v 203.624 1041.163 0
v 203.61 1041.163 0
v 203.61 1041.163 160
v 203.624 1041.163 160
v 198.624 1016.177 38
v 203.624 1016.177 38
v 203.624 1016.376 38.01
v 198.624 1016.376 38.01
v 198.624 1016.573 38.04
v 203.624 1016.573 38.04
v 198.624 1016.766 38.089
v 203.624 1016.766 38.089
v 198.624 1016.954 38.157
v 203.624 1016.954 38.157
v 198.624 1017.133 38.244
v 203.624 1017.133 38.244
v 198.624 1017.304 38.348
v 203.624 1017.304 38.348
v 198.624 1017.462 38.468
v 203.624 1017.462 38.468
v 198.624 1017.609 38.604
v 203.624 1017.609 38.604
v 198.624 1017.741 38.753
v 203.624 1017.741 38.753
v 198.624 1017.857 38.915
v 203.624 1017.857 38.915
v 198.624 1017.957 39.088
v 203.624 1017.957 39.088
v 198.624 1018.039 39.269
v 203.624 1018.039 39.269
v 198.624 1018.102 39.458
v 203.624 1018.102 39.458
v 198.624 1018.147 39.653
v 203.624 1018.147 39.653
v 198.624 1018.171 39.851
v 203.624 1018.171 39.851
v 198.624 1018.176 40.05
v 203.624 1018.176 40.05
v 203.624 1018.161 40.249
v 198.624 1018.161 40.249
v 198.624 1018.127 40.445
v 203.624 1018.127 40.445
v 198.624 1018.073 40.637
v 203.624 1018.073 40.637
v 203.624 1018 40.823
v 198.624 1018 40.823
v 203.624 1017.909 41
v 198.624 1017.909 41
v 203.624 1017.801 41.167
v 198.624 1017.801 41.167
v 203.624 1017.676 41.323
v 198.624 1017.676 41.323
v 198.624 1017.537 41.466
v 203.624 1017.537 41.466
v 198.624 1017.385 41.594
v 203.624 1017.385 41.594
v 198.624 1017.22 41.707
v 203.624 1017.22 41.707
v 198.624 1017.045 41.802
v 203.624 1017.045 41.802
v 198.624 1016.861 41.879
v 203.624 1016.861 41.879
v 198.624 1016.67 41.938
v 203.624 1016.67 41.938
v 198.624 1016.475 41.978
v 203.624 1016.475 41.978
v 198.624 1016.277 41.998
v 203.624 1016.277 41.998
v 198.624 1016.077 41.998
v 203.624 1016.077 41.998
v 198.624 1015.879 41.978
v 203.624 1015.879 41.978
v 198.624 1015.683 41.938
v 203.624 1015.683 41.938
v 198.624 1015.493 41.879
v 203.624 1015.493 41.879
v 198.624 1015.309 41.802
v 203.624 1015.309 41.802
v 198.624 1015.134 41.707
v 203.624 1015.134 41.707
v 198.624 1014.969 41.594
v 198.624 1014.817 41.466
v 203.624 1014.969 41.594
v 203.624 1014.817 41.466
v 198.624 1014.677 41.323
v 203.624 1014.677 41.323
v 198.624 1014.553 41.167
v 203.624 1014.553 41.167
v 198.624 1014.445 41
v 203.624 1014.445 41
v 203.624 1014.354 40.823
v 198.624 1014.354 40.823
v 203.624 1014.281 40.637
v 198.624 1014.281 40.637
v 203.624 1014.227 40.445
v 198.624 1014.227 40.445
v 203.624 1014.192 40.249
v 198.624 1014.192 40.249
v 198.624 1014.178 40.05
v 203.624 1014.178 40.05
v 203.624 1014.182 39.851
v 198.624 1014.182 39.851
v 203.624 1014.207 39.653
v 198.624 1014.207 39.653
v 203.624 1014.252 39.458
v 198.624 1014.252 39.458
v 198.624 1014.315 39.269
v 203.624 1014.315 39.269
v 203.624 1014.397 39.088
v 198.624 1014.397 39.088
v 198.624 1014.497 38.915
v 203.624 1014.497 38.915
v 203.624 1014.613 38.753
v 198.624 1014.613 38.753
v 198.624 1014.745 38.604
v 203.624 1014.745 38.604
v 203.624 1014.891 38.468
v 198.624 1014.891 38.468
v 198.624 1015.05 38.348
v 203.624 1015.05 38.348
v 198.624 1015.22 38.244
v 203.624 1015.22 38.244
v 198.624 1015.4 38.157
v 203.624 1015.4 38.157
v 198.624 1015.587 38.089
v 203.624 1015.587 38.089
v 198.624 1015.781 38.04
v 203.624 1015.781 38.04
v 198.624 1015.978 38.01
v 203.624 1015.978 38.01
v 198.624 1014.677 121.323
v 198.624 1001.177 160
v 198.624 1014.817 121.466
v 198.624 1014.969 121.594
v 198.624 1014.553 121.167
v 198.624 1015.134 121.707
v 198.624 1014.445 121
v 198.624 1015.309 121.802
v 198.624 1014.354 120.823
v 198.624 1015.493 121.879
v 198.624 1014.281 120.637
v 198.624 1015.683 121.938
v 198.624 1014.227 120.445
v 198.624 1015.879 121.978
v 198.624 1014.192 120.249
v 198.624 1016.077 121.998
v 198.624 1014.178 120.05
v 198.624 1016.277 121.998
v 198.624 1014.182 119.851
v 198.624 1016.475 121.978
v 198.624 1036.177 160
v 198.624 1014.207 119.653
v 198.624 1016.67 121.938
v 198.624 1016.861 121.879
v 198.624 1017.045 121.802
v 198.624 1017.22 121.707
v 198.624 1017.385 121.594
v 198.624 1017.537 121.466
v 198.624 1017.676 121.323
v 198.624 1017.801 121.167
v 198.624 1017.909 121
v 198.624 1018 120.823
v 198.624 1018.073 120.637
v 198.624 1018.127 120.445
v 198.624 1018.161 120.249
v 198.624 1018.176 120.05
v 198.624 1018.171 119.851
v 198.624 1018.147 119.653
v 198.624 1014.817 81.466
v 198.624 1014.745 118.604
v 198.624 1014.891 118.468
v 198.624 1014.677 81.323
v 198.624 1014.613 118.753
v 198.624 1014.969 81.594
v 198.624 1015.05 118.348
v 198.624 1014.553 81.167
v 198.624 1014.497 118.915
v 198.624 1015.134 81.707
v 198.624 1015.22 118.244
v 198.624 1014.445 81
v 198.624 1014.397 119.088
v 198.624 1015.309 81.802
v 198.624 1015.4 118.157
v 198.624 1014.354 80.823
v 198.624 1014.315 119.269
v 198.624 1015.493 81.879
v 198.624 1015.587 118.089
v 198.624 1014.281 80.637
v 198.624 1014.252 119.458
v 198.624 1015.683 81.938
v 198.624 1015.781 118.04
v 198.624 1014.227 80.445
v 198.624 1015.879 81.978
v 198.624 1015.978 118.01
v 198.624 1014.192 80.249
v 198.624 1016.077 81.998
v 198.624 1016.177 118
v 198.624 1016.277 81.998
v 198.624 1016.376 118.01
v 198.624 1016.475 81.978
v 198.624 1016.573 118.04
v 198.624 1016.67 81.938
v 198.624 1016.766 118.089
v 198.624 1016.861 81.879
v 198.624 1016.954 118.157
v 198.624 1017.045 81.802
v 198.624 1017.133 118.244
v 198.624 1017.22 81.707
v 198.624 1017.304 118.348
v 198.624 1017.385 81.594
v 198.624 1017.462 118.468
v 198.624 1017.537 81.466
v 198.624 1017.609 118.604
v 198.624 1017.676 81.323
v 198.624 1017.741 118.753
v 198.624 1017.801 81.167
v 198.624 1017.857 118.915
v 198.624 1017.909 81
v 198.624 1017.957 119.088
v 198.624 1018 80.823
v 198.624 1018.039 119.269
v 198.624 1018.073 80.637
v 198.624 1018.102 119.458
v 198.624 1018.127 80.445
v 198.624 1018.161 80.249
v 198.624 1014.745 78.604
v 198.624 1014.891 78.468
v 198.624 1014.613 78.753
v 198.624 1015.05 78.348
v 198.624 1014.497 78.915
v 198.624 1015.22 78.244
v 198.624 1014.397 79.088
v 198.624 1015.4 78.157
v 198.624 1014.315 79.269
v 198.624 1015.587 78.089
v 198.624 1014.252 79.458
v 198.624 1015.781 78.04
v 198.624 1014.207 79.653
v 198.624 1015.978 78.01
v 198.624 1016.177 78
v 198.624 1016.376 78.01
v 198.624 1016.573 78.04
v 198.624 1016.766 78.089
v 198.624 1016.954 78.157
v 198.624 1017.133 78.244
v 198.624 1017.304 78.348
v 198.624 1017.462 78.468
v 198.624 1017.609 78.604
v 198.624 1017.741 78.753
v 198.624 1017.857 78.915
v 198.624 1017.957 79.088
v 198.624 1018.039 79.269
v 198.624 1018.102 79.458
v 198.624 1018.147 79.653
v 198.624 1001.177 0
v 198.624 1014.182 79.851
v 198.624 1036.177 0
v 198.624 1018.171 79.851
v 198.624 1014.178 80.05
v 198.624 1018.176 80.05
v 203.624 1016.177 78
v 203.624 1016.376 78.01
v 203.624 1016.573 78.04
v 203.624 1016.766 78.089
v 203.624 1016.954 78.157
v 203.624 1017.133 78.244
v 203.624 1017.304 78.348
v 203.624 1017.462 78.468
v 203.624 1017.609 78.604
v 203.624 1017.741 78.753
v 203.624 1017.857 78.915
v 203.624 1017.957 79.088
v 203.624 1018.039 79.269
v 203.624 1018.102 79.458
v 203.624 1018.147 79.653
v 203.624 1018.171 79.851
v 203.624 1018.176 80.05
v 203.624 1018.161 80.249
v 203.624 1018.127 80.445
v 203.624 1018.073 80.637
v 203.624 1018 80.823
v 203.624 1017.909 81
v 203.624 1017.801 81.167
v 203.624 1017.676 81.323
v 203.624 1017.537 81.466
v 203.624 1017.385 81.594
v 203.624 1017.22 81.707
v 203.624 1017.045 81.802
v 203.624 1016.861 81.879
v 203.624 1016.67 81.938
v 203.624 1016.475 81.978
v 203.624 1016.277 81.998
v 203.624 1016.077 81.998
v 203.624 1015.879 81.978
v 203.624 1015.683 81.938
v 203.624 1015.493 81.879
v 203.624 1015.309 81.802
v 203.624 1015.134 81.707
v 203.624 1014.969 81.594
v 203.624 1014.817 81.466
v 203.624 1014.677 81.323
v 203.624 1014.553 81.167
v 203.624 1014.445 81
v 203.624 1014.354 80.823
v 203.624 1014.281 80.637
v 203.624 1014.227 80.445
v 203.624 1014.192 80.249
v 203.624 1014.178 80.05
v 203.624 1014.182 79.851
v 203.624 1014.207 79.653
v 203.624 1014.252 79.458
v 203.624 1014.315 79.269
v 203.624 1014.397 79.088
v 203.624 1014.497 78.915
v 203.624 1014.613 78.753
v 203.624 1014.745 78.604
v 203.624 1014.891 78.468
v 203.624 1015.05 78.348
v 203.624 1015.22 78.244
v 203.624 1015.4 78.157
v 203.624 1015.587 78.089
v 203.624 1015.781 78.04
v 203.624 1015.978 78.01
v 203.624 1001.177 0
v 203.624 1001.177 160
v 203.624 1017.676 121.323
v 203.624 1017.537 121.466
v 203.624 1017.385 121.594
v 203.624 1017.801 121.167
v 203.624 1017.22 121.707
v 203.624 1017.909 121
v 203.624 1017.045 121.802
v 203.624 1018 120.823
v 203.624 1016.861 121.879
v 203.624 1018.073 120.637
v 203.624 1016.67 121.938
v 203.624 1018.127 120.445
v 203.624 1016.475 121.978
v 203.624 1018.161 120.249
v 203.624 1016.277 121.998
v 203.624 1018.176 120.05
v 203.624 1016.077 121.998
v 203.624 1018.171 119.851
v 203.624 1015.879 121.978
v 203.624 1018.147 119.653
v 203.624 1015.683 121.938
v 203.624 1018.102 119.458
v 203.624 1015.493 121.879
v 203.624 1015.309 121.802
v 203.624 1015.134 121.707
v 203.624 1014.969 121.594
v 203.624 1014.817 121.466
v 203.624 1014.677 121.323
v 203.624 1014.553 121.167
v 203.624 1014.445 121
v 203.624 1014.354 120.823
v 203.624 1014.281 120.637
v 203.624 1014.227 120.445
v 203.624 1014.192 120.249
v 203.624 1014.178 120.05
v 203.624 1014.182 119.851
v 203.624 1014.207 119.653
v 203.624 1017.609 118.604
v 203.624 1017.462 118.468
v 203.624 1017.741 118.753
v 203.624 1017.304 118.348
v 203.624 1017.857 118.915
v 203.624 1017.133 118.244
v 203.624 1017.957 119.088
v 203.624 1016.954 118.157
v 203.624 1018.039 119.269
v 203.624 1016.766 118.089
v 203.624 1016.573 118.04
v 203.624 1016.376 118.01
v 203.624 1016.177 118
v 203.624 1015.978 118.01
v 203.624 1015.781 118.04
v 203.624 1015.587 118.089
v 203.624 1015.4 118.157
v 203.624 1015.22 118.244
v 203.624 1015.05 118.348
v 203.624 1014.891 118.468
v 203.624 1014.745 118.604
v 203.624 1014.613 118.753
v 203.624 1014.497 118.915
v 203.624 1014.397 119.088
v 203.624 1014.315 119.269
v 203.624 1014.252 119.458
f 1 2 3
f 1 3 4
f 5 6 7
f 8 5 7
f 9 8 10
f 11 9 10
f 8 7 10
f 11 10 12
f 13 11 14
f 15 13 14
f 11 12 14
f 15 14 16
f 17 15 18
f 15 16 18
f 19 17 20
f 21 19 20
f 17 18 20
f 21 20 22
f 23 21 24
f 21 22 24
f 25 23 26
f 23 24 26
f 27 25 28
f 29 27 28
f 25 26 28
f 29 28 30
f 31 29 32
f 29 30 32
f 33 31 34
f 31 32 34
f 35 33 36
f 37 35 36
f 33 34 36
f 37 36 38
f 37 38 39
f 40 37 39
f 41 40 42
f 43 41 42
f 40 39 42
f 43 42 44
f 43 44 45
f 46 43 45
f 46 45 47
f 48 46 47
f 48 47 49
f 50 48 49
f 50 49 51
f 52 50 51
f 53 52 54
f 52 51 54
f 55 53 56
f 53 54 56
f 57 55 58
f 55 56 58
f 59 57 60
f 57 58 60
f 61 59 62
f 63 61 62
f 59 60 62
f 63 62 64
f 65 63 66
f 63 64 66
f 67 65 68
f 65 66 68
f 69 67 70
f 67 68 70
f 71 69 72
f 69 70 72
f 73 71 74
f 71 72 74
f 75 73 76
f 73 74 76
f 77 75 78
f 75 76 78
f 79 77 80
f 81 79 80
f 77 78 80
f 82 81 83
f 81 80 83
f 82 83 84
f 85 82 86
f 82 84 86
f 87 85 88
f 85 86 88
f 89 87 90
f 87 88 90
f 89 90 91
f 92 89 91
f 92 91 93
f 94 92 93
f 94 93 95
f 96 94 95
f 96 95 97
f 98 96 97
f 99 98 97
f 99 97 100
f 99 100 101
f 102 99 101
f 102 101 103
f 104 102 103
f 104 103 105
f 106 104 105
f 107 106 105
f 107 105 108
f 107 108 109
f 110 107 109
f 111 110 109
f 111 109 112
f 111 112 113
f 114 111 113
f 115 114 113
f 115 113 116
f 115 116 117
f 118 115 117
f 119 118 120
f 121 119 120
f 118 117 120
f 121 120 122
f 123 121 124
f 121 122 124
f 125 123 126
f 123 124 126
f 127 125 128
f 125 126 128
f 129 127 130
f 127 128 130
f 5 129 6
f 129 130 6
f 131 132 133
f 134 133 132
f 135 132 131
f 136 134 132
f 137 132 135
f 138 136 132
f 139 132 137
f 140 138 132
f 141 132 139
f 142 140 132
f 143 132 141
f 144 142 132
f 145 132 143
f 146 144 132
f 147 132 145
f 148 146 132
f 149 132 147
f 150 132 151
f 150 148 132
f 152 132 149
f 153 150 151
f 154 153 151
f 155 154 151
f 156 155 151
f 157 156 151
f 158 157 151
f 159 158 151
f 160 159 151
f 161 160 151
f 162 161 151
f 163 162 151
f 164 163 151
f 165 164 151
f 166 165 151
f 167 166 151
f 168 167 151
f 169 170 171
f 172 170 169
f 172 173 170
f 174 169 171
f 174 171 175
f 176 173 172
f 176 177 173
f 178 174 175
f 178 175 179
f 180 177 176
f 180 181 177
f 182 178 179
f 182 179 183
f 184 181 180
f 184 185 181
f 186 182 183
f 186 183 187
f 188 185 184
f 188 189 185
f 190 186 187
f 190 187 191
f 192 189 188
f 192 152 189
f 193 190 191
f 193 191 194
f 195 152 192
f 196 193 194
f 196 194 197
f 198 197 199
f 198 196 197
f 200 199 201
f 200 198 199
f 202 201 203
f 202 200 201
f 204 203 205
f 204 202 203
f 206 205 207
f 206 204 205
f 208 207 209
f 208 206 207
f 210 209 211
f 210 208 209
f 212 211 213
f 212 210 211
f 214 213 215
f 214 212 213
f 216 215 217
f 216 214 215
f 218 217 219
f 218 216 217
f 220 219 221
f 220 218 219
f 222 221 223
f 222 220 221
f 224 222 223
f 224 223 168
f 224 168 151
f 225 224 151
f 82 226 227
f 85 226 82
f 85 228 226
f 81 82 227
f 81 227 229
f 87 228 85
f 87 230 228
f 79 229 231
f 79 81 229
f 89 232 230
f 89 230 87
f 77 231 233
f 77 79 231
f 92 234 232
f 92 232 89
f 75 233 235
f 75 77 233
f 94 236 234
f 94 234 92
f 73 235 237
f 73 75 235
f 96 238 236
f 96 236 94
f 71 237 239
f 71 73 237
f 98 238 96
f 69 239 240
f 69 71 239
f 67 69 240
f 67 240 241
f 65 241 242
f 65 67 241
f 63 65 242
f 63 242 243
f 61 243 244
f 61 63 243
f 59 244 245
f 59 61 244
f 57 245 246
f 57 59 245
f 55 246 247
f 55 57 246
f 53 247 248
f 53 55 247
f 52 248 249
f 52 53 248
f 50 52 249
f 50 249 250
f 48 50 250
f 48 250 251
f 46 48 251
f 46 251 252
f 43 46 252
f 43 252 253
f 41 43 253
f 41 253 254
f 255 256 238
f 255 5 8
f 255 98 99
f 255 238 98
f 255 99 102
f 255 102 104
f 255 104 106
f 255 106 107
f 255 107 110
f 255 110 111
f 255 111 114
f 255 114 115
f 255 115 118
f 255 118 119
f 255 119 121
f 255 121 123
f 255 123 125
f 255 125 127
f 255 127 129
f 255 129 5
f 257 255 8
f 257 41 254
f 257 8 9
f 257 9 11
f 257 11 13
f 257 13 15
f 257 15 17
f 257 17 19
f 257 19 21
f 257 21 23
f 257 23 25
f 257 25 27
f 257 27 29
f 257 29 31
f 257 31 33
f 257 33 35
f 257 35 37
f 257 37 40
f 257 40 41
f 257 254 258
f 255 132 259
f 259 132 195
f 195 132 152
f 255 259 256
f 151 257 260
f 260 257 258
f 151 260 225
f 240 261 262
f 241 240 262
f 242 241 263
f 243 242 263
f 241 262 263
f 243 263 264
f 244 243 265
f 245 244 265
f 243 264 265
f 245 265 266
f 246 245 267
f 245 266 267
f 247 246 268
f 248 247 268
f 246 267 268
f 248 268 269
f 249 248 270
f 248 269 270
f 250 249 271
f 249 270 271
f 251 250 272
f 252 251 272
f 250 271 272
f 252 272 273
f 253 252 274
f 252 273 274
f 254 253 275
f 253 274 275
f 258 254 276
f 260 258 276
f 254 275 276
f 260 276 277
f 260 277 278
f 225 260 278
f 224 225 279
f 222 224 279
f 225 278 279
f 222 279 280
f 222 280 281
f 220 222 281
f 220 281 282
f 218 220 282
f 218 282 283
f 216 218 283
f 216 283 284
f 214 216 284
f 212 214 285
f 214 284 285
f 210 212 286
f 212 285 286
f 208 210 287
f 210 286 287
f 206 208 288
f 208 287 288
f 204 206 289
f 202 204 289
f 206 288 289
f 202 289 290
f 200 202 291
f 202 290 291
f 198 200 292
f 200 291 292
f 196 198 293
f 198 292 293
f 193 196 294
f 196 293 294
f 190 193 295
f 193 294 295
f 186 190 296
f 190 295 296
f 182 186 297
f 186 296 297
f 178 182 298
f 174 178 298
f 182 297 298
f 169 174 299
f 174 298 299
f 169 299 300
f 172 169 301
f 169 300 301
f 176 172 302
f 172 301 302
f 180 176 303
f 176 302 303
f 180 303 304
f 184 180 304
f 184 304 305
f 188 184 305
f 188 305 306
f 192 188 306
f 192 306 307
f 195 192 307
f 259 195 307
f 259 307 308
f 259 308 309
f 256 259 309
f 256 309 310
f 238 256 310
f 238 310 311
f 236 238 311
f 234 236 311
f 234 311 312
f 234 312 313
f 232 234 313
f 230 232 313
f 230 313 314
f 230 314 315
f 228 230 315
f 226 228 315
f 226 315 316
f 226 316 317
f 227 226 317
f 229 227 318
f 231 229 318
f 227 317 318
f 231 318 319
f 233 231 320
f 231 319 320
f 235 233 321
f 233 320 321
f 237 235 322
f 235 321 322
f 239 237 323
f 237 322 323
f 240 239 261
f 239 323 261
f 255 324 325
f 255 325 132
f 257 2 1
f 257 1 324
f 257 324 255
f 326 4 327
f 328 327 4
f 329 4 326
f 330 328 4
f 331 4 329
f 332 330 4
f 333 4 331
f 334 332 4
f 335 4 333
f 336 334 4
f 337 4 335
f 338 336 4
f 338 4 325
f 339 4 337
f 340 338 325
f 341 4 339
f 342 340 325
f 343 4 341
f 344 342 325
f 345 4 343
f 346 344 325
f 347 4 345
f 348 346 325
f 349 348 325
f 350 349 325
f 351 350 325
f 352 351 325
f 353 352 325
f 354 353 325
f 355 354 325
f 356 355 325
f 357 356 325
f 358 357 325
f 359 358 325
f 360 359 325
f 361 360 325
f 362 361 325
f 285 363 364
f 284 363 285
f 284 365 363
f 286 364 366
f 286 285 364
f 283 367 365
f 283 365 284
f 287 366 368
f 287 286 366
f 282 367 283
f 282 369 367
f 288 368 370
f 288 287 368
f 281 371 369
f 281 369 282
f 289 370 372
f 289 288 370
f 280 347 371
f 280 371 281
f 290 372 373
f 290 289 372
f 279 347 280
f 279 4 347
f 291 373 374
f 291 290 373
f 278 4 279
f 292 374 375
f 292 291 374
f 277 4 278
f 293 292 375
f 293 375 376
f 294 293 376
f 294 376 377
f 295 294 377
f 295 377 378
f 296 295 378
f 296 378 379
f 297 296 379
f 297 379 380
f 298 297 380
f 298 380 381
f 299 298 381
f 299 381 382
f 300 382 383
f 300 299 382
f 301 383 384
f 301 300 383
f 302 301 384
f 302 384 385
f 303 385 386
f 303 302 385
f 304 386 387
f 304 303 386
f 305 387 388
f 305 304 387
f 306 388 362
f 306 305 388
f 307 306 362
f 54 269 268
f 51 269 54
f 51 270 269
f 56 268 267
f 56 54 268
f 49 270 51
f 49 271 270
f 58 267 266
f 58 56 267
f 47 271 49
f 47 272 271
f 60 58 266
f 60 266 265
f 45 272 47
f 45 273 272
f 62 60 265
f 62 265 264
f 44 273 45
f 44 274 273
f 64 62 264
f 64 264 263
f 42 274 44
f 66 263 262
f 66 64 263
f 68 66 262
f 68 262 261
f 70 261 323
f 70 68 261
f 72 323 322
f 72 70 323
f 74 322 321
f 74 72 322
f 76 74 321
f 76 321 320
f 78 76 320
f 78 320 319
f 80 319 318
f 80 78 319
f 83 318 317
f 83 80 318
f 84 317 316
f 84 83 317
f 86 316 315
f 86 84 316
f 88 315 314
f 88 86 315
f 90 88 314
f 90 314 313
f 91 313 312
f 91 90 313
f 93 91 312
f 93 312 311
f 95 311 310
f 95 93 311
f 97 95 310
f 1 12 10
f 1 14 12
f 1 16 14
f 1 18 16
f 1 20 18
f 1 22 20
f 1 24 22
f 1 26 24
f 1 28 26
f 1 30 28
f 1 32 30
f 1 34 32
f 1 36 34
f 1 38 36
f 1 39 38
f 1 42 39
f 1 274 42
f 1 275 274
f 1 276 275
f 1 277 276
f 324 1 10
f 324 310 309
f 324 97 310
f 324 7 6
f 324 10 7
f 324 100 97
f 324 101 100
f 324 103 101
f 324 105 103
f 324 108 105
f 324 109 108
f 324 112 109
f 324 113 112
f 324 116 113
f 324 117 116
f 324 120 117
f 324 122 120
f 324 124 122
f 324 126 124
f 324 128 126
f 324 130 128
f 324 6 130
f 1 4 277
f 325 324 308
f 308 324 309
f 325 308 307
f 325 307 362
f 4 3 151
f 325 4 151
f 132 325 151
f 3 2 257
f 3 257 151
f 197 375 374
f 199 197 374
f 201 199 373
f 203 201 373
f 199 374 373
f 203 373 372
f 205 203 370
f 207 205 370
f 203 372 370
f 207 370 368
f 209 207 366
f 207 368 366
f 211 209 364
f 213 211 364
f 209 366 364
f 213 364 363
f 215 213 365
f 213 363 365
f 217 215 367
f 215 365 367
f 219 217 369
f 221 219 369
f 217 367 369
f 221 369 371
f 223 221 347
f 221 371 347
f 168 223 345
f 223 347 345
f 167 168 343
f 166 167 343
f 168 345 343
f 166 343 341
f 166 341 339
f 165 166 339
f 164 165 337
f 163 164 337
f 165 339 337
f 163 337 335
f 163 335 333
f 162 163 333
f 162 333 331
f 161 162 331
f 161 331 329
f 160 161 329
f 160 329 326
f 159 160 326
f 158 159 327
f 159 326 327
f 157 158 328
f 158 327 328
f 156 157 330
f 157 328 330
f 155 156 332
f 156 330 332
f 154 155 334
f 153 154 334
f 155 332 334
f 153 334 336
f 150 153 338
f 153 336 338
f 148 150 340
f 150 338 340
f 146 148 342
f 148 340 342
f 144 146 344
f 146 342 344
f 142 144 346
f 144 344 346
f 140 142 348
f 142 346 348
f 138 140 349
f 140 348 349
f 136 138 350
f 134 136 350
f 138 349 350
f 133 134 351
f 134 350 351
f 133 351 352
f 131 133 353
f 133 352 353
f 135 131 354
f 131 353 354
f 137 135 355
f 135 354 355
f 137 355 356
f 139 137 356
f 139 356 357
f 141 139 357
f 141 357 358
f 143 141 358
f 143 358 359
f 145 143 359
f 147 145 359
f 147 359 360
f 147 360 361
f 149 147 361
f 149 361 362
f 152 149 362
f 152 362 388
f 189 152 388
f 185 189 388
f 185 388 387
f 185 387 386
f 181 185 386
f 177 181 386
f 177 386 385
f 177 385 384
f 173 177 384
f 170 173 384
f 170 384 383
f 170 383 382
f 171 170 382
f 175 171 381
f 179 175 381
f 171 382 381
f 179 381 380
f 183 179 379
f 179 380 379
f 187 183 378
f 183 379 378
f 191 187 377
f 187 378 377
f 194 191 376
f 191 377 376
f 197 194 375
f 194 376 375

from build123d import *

# Parameters (mm, degrees)
EXTRUDE_1_DEPTH    = 160
CHAMFER1_SIZE      = 5
CHAMFER1_SIZE2     = 4.986026333
SKETCH1_R          = 2
CUT_EXTRUDE1_DEPTH = 5
LPATTERN1_COUNT    = 3
LPATTERN1_PITCH    = 40


with BuildPart() as part:
    # 草圖1 → 填料-伸長1 (new body)
    with BuildSketch(Plane.XY):
        Polygon((203.623972775, 1001.176903993), (198.623972775, 1001.176903993), (198.623972775, 1041.176903993), (203.623972775, 1041.162871417), align=None)
    extrude(amount=EXTRUDE_1_DEPTH)

    # Chamfer1
    chamfer1_edges = [part.edges().sort_by_distance(p)[0] for p in [
        (198.623972775, 1041.176903993, 80),
    ]]
    chamfer1_side = [part.faces().sort_by_distance(p)[0] for p in [
        (198.623972775, 1021.176903993, 80),
    ]]
    chamfer(chamfer1_edges, length=CHAMFER1_SIZE, length2=CHAMFER1_SIZE2, reference=chamfer1_side[0])

    # Sketch1 → Cut-Extrude1 (cut)
    with BuildSketch(Plane(origin=(203.623972775, 0, 0), x_dir=(0, 0, -1), z_dir=(1, 0, 0))):
        with Locations((-40, 1016.176903993)):
            Circle(SKETCH1_R)
    cut_extrude1 = extrude(amount=-CUT_EXTRUDE1_DEPTH, mode=Mode.SUBTRACT)

    # LPattern1: Cut-Extrude1 ×3
    with Locations(*[(0, 0, i * LPATTERN1_PITCH) for i in range(1, LPATTERN1_COUNT)]):
        add(cut_extrude1, mode=Mode.SUBTRACT)


solid = part.part
